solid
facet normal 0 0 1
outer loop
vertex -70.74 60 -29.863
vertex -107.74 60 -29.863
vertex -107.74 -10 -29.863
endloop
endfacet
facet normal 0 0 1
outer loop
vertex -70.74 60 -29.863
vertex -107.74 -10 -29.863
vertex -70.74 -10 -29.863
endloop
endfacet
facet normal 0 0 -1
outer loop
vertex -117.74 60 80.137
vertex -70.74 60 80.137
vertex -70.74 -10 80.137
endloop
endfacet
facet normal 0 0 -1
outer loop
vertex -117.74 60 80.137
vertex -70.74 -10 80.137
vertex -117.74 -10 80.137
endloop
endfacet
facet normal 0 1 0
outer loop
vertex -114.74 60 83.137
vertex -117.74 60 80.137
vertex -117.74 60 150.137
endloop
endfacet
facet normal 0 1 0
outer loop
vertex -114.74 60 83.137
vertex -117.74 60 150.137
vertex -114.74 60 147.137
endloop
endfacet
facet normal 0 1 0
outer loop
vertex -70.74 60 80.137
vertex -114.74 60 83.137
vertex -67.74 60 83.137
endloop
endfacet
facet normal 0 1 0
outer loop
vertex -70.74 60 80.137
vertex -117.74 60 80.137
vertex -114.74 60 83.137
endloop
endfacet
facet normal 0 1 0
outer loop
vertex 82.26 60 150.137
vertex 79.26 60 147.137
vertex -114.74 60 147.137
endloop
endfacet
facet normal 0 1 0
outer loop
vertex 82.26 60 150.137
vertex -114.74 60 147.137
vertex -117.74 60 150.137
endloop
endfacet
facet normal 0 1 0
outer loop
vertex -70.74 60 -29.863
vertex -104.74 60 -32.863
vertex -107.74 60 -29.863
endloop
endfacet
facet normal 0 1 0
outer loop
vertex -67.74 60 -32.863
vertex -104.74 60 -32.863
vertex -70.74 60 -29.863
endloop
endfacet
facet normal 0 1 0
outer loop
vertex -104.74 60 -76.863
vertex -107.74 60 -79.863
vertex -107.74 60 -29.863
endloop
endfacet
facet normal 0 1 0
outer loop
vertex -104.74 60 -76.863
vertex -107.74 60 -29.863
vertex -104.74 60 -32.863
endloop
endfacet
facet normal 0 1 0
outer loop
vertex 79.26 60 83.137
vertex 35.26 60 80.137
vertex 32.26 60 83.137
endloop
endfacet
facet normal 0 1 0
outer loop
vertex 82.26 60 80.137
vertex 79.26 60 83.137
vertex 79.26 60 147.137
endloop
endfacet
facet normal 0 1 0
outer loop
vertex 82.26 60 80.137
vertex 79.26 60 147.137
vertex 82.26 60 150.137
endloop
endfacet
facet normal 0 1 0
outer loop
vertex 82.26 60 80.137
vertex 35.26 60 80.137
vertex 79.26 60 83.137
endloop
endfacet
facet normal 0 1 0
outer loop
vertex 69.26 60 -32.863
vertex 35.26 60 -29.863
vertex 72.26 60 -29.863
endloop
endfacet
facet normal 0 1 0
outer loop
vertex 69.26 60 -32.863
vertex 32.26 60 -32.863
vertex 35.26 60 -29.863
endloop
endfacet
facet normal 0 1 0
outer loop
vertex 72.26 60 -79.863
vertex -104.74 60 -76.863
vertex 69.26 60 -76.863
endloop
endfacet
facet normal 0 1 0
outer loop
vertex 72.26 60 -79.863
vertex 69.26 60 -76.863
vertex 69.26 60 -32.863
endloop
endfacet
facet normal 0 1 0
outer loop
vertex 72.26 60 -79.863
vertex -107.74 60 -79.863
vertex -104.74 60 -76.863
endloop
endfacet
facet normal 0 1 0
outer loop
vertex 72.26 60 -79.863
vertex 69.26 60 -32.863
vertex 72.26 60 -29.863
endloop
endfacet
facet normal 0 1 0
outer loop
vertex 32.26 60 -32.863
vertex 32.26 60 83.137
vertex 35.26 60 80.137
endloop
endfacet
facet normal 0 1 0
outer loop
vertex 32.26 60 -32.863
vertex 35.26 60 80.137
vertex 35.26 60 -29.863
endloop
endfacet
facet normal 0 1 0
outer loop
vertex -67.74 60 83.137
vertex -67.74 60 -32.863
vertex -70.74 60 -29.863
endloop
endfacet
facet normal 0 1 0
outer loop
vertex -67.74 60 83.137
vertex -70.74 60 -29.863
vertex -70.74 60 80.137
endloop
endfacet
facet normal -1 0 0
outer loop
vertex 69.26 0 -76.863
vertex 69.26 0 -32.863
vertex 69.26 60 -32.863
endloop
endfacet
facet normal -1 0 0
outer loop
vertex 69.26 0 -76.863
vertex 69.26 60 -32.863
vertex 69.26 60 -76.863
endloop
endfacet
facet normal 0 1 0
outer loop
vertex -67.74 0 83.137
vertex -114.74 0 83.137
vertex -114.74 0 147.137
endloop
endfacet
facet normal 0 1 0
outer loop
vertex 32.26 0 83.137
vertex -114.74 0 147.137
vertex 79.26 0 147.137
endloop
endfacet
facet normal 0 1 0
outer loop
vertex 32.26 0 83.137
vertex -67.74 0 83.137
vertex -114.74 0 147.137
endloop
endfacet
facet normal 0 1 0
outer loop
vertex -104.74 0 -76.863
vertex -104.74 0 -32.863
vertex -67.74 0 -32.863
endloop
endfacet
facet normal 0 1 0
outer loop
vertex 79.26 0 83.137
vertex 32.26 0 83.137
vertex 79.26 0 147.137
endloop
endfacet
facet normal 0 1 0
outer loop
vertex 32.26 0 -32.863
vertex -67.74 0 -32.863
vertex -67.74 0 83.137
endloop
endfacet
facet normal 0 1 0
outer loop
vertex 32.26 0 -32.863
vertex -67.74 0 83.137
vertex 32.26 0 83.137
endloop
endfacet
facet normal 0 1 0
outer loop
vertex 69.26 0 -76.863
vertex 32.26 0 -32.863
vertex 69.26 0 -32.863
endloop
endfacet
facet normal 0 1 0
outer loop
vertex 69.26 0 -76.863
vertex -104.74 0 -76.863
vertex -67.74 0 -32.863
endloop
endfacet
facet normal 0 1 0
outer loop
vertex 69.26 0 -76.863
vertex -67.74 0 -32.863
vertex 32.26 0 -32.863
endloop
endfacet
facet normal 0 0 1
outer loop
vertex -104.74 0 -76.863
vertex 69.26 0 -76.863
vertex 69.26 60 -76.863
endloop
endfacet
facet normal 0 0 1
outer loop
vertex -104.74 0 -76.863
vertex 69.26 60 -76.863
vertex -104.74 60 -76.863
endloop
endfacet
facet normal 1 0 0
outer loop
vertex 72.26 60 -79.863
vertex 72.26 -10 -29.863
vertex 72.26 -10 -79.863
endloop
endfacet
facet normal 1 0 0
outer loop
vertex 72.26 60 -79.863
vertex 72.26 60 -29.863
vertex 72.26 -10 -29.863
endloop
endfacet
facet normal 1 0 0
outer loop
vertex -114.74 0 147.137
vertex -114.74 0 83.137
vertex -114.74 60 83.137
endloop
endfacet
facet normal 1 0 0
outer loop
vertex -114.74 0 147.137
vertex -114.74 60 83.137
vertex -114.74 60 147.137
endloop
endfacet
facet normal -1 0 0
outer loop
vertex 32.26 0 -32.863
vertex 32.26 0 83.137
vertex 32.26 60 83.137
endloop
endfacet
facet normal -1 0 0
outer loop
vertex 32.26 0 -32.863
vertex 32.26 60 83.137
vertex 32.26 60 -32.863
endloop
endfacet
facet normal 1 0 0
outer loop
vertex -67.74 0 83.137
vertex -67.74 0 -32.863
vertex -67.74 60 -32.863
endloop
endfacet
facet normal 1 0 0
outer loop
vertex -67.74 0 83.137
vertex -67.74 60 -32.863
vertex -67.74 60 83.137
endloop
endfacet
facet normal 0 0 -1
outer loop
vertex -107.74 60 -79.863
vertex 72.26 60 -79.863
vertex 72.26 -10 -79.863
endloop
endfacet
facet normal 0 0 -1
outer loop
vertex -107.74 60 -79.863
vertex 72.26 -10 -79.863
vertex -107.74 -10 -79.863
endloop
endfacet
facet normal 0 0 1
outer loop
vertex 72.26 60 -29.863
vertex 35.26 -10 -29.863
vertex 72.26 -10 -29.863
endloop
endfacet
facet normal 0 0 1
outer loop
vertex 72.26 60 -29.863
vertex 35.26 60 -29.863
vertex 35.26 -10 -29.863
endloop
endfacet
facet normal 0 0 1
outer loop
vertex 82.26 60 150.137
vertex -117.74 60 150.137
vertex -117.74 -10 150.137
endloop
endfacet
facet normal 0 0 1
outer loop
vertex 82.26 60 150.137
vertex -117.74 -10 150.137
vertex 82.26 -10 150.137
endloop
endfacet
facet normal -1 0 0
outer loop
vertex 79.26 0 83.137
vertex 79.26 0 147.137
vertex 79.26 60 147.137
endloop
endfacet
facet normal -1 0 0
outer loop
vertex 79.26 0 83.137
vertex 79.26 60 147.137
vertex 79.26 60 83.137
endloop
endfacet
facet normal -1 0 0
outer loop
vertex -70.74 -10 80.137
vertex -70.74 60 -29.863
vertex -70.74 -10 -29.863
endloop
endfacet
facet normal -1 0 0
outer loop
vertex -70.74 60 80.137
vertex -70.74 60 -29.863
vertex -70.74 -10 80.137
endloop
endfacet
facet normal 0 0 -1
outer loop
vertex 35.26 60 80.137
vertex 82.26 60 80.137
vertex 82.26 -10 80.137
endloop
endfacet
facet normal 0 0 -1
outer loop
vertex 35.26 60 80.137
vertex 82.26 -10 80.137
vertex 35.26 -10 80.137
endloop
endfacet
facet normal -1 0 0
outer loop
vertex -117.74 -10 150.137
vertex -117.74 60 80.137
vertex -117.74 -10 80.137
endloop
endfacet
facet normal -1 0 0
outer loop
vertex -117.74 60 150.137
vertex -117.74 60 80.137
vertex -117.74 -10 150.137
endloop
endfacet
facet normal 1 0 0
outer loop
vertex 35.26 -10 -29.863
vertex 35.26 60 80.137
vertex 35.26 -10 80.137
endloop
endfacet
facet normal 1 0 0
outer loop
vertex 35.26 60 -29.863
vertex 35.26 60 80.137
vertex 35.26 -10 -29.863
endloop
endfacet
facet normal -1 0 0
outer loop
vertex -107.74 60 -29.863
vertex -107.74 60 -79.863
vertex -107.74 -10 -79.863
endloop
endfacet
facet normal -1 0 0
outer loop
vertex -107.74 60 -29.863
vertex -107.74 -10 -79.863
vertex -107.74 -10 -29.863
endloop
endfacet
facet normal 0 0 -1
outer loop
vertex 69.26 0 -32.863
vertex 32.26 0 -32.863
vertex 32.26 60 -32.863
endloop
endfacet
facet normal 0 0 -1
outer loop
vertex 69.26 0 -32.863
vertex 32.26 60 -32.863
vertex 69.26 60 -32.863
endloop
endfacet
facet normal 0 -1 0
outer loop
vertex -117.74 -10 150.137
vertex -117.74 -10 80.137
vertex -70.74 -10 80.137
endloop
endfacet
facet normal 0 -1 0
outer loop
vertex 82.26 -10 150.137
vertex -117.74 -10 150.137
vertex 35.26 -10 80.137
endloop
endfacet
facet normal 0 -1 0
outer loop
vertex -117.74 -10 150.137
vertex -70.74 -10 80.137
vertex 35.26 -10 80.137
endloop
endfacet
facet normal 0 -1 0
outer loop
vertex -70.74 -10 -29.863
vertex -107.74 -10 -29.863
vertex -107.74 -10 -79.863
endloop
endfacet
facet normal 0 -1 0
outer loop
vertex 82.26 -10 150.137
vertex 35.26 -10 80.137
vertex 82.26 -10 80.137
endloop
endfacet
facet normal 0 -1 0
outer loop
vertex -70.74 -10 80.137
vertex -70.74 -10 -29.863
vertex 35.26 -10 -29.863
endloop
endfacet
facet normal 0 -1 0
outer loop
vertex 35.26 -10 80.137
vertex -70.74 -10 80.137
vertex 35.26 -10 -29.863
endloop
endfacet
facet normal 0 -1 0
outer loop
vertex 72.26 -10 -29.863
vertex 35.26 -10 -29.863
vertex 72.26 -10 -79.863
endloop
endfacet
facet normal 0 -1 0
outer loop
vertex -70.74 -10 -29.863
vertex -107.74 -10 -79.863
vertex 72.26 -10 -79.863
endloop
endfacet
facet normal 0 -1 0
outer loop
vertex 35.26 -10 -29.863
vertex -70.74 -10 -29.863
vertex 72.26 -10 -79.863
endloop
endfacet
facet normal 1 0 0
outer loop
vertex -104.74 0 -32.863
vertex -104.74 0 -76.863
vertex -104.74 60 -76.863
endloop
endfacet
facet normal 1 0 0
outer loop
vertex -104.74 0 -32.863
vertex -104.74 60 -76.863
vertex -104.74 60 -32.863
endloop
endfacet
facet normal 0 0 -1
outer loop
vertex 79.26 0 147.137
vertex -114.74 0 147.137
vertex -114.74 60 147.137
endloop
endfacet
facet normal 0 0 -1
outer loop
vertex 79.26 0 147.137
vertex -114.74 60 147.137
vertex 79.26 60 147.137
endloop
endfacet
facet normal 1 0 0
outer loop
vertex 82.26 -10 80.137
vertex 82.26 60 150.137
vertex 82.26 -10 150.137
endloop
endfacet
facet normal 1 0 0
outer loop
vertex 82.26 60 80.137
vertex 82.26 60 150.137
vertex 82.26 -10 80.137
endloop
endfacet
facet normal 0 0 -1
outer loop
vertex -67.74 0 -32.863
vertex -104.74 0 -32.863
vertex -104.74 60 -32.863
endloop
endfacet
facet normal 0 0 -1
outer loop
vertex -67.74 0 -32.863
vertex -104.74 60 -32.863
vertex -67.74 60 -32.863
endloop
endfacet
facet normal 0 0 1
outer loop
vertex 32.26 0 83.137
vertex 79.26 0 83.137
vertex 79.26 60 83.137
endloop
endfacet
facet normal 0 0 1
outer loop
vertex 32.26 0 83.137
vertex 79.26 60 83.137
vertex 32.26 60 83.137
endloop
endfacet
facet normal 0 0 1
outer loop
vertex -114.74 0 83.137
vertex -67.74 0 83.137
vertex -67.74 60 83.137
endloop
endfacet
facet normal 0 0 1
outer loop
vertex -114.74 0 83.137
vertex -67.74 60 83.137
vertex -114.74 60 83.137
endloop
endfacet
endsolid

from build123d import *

# Parameters (mm, degrees)
BOSS_EXTRUDE1_DEPTH = 60
BOSS_EXTRUDE2_DEPTH = 10


with BuildPart() as part:
    # Sketch1 → Boss-Extrude1 (new body)
    with BuildSketch(Plane(origin=(0, 0, 0), x_dir=(1, 0, 0), z_dir=(0, 1, 0))):
        Polygon((72.260273973, 79.863013699), (-107.739726027, 79.863013699), (-107.739726027, 29.863013699), (-70.739726027, 29.863013699), (-70.739726027, -80.136986301), (-117.739726027, -80.136986301), (-117.739726027, -150.136986301), (82.260273973, -150.136986301), (82.260273973, -80.136986301), (35.260273973, -80.136986301), (35.260273973, 29.863013699), (72.260273973, 29.863013699), align=None)
        Polygon((69.260273973, 76.863013699), (-104.739726027, 76.863013699), (-104.739726027, 32.863013699), (-67.739726027, 32.863013699), (-67.739726027, -83.136986301), (-114.739726027, -83.136986301), (-114.739726027, -147.136986301), (79.260273973, -147.136986301), (79.260273973, -83.136986301), (32.260273973, -83.136986301), (32.260273973, 32.863013699), (69.260273973, 32.863013699), align=None, mode=Mode.SUBTRACT)
    extrude(amount=BOSS_EXTRUDE1_DEPTH)

    # Sketch2 → Boss-Extrude2 (add)
    with BuildSketch(Plane(origin=(0, 0, 0), x_dir=(1, 0, 0), z_dir=(0, 1, 0))):
        Polygon((72.260273973, 29.863013699), (72.260273973, 79.863013699), (-107.739726027, 79.863013699), (-107.739726027, 29.863013699), (-70.739726027, 29.863013699), (-70.739726027, -80.136986301), (-117.739726027, -80.136986301), (-117.739726027, -150.136986301), (82.260273973, -150.136986301), (82.260273973, -80.136986301), (35.260273973, -80.136986301), (35.260273973, 29.863013699), align=None)
    extrude(amount=-BOSS_EXTRUDE2_DEPTH)


solid = part.part
